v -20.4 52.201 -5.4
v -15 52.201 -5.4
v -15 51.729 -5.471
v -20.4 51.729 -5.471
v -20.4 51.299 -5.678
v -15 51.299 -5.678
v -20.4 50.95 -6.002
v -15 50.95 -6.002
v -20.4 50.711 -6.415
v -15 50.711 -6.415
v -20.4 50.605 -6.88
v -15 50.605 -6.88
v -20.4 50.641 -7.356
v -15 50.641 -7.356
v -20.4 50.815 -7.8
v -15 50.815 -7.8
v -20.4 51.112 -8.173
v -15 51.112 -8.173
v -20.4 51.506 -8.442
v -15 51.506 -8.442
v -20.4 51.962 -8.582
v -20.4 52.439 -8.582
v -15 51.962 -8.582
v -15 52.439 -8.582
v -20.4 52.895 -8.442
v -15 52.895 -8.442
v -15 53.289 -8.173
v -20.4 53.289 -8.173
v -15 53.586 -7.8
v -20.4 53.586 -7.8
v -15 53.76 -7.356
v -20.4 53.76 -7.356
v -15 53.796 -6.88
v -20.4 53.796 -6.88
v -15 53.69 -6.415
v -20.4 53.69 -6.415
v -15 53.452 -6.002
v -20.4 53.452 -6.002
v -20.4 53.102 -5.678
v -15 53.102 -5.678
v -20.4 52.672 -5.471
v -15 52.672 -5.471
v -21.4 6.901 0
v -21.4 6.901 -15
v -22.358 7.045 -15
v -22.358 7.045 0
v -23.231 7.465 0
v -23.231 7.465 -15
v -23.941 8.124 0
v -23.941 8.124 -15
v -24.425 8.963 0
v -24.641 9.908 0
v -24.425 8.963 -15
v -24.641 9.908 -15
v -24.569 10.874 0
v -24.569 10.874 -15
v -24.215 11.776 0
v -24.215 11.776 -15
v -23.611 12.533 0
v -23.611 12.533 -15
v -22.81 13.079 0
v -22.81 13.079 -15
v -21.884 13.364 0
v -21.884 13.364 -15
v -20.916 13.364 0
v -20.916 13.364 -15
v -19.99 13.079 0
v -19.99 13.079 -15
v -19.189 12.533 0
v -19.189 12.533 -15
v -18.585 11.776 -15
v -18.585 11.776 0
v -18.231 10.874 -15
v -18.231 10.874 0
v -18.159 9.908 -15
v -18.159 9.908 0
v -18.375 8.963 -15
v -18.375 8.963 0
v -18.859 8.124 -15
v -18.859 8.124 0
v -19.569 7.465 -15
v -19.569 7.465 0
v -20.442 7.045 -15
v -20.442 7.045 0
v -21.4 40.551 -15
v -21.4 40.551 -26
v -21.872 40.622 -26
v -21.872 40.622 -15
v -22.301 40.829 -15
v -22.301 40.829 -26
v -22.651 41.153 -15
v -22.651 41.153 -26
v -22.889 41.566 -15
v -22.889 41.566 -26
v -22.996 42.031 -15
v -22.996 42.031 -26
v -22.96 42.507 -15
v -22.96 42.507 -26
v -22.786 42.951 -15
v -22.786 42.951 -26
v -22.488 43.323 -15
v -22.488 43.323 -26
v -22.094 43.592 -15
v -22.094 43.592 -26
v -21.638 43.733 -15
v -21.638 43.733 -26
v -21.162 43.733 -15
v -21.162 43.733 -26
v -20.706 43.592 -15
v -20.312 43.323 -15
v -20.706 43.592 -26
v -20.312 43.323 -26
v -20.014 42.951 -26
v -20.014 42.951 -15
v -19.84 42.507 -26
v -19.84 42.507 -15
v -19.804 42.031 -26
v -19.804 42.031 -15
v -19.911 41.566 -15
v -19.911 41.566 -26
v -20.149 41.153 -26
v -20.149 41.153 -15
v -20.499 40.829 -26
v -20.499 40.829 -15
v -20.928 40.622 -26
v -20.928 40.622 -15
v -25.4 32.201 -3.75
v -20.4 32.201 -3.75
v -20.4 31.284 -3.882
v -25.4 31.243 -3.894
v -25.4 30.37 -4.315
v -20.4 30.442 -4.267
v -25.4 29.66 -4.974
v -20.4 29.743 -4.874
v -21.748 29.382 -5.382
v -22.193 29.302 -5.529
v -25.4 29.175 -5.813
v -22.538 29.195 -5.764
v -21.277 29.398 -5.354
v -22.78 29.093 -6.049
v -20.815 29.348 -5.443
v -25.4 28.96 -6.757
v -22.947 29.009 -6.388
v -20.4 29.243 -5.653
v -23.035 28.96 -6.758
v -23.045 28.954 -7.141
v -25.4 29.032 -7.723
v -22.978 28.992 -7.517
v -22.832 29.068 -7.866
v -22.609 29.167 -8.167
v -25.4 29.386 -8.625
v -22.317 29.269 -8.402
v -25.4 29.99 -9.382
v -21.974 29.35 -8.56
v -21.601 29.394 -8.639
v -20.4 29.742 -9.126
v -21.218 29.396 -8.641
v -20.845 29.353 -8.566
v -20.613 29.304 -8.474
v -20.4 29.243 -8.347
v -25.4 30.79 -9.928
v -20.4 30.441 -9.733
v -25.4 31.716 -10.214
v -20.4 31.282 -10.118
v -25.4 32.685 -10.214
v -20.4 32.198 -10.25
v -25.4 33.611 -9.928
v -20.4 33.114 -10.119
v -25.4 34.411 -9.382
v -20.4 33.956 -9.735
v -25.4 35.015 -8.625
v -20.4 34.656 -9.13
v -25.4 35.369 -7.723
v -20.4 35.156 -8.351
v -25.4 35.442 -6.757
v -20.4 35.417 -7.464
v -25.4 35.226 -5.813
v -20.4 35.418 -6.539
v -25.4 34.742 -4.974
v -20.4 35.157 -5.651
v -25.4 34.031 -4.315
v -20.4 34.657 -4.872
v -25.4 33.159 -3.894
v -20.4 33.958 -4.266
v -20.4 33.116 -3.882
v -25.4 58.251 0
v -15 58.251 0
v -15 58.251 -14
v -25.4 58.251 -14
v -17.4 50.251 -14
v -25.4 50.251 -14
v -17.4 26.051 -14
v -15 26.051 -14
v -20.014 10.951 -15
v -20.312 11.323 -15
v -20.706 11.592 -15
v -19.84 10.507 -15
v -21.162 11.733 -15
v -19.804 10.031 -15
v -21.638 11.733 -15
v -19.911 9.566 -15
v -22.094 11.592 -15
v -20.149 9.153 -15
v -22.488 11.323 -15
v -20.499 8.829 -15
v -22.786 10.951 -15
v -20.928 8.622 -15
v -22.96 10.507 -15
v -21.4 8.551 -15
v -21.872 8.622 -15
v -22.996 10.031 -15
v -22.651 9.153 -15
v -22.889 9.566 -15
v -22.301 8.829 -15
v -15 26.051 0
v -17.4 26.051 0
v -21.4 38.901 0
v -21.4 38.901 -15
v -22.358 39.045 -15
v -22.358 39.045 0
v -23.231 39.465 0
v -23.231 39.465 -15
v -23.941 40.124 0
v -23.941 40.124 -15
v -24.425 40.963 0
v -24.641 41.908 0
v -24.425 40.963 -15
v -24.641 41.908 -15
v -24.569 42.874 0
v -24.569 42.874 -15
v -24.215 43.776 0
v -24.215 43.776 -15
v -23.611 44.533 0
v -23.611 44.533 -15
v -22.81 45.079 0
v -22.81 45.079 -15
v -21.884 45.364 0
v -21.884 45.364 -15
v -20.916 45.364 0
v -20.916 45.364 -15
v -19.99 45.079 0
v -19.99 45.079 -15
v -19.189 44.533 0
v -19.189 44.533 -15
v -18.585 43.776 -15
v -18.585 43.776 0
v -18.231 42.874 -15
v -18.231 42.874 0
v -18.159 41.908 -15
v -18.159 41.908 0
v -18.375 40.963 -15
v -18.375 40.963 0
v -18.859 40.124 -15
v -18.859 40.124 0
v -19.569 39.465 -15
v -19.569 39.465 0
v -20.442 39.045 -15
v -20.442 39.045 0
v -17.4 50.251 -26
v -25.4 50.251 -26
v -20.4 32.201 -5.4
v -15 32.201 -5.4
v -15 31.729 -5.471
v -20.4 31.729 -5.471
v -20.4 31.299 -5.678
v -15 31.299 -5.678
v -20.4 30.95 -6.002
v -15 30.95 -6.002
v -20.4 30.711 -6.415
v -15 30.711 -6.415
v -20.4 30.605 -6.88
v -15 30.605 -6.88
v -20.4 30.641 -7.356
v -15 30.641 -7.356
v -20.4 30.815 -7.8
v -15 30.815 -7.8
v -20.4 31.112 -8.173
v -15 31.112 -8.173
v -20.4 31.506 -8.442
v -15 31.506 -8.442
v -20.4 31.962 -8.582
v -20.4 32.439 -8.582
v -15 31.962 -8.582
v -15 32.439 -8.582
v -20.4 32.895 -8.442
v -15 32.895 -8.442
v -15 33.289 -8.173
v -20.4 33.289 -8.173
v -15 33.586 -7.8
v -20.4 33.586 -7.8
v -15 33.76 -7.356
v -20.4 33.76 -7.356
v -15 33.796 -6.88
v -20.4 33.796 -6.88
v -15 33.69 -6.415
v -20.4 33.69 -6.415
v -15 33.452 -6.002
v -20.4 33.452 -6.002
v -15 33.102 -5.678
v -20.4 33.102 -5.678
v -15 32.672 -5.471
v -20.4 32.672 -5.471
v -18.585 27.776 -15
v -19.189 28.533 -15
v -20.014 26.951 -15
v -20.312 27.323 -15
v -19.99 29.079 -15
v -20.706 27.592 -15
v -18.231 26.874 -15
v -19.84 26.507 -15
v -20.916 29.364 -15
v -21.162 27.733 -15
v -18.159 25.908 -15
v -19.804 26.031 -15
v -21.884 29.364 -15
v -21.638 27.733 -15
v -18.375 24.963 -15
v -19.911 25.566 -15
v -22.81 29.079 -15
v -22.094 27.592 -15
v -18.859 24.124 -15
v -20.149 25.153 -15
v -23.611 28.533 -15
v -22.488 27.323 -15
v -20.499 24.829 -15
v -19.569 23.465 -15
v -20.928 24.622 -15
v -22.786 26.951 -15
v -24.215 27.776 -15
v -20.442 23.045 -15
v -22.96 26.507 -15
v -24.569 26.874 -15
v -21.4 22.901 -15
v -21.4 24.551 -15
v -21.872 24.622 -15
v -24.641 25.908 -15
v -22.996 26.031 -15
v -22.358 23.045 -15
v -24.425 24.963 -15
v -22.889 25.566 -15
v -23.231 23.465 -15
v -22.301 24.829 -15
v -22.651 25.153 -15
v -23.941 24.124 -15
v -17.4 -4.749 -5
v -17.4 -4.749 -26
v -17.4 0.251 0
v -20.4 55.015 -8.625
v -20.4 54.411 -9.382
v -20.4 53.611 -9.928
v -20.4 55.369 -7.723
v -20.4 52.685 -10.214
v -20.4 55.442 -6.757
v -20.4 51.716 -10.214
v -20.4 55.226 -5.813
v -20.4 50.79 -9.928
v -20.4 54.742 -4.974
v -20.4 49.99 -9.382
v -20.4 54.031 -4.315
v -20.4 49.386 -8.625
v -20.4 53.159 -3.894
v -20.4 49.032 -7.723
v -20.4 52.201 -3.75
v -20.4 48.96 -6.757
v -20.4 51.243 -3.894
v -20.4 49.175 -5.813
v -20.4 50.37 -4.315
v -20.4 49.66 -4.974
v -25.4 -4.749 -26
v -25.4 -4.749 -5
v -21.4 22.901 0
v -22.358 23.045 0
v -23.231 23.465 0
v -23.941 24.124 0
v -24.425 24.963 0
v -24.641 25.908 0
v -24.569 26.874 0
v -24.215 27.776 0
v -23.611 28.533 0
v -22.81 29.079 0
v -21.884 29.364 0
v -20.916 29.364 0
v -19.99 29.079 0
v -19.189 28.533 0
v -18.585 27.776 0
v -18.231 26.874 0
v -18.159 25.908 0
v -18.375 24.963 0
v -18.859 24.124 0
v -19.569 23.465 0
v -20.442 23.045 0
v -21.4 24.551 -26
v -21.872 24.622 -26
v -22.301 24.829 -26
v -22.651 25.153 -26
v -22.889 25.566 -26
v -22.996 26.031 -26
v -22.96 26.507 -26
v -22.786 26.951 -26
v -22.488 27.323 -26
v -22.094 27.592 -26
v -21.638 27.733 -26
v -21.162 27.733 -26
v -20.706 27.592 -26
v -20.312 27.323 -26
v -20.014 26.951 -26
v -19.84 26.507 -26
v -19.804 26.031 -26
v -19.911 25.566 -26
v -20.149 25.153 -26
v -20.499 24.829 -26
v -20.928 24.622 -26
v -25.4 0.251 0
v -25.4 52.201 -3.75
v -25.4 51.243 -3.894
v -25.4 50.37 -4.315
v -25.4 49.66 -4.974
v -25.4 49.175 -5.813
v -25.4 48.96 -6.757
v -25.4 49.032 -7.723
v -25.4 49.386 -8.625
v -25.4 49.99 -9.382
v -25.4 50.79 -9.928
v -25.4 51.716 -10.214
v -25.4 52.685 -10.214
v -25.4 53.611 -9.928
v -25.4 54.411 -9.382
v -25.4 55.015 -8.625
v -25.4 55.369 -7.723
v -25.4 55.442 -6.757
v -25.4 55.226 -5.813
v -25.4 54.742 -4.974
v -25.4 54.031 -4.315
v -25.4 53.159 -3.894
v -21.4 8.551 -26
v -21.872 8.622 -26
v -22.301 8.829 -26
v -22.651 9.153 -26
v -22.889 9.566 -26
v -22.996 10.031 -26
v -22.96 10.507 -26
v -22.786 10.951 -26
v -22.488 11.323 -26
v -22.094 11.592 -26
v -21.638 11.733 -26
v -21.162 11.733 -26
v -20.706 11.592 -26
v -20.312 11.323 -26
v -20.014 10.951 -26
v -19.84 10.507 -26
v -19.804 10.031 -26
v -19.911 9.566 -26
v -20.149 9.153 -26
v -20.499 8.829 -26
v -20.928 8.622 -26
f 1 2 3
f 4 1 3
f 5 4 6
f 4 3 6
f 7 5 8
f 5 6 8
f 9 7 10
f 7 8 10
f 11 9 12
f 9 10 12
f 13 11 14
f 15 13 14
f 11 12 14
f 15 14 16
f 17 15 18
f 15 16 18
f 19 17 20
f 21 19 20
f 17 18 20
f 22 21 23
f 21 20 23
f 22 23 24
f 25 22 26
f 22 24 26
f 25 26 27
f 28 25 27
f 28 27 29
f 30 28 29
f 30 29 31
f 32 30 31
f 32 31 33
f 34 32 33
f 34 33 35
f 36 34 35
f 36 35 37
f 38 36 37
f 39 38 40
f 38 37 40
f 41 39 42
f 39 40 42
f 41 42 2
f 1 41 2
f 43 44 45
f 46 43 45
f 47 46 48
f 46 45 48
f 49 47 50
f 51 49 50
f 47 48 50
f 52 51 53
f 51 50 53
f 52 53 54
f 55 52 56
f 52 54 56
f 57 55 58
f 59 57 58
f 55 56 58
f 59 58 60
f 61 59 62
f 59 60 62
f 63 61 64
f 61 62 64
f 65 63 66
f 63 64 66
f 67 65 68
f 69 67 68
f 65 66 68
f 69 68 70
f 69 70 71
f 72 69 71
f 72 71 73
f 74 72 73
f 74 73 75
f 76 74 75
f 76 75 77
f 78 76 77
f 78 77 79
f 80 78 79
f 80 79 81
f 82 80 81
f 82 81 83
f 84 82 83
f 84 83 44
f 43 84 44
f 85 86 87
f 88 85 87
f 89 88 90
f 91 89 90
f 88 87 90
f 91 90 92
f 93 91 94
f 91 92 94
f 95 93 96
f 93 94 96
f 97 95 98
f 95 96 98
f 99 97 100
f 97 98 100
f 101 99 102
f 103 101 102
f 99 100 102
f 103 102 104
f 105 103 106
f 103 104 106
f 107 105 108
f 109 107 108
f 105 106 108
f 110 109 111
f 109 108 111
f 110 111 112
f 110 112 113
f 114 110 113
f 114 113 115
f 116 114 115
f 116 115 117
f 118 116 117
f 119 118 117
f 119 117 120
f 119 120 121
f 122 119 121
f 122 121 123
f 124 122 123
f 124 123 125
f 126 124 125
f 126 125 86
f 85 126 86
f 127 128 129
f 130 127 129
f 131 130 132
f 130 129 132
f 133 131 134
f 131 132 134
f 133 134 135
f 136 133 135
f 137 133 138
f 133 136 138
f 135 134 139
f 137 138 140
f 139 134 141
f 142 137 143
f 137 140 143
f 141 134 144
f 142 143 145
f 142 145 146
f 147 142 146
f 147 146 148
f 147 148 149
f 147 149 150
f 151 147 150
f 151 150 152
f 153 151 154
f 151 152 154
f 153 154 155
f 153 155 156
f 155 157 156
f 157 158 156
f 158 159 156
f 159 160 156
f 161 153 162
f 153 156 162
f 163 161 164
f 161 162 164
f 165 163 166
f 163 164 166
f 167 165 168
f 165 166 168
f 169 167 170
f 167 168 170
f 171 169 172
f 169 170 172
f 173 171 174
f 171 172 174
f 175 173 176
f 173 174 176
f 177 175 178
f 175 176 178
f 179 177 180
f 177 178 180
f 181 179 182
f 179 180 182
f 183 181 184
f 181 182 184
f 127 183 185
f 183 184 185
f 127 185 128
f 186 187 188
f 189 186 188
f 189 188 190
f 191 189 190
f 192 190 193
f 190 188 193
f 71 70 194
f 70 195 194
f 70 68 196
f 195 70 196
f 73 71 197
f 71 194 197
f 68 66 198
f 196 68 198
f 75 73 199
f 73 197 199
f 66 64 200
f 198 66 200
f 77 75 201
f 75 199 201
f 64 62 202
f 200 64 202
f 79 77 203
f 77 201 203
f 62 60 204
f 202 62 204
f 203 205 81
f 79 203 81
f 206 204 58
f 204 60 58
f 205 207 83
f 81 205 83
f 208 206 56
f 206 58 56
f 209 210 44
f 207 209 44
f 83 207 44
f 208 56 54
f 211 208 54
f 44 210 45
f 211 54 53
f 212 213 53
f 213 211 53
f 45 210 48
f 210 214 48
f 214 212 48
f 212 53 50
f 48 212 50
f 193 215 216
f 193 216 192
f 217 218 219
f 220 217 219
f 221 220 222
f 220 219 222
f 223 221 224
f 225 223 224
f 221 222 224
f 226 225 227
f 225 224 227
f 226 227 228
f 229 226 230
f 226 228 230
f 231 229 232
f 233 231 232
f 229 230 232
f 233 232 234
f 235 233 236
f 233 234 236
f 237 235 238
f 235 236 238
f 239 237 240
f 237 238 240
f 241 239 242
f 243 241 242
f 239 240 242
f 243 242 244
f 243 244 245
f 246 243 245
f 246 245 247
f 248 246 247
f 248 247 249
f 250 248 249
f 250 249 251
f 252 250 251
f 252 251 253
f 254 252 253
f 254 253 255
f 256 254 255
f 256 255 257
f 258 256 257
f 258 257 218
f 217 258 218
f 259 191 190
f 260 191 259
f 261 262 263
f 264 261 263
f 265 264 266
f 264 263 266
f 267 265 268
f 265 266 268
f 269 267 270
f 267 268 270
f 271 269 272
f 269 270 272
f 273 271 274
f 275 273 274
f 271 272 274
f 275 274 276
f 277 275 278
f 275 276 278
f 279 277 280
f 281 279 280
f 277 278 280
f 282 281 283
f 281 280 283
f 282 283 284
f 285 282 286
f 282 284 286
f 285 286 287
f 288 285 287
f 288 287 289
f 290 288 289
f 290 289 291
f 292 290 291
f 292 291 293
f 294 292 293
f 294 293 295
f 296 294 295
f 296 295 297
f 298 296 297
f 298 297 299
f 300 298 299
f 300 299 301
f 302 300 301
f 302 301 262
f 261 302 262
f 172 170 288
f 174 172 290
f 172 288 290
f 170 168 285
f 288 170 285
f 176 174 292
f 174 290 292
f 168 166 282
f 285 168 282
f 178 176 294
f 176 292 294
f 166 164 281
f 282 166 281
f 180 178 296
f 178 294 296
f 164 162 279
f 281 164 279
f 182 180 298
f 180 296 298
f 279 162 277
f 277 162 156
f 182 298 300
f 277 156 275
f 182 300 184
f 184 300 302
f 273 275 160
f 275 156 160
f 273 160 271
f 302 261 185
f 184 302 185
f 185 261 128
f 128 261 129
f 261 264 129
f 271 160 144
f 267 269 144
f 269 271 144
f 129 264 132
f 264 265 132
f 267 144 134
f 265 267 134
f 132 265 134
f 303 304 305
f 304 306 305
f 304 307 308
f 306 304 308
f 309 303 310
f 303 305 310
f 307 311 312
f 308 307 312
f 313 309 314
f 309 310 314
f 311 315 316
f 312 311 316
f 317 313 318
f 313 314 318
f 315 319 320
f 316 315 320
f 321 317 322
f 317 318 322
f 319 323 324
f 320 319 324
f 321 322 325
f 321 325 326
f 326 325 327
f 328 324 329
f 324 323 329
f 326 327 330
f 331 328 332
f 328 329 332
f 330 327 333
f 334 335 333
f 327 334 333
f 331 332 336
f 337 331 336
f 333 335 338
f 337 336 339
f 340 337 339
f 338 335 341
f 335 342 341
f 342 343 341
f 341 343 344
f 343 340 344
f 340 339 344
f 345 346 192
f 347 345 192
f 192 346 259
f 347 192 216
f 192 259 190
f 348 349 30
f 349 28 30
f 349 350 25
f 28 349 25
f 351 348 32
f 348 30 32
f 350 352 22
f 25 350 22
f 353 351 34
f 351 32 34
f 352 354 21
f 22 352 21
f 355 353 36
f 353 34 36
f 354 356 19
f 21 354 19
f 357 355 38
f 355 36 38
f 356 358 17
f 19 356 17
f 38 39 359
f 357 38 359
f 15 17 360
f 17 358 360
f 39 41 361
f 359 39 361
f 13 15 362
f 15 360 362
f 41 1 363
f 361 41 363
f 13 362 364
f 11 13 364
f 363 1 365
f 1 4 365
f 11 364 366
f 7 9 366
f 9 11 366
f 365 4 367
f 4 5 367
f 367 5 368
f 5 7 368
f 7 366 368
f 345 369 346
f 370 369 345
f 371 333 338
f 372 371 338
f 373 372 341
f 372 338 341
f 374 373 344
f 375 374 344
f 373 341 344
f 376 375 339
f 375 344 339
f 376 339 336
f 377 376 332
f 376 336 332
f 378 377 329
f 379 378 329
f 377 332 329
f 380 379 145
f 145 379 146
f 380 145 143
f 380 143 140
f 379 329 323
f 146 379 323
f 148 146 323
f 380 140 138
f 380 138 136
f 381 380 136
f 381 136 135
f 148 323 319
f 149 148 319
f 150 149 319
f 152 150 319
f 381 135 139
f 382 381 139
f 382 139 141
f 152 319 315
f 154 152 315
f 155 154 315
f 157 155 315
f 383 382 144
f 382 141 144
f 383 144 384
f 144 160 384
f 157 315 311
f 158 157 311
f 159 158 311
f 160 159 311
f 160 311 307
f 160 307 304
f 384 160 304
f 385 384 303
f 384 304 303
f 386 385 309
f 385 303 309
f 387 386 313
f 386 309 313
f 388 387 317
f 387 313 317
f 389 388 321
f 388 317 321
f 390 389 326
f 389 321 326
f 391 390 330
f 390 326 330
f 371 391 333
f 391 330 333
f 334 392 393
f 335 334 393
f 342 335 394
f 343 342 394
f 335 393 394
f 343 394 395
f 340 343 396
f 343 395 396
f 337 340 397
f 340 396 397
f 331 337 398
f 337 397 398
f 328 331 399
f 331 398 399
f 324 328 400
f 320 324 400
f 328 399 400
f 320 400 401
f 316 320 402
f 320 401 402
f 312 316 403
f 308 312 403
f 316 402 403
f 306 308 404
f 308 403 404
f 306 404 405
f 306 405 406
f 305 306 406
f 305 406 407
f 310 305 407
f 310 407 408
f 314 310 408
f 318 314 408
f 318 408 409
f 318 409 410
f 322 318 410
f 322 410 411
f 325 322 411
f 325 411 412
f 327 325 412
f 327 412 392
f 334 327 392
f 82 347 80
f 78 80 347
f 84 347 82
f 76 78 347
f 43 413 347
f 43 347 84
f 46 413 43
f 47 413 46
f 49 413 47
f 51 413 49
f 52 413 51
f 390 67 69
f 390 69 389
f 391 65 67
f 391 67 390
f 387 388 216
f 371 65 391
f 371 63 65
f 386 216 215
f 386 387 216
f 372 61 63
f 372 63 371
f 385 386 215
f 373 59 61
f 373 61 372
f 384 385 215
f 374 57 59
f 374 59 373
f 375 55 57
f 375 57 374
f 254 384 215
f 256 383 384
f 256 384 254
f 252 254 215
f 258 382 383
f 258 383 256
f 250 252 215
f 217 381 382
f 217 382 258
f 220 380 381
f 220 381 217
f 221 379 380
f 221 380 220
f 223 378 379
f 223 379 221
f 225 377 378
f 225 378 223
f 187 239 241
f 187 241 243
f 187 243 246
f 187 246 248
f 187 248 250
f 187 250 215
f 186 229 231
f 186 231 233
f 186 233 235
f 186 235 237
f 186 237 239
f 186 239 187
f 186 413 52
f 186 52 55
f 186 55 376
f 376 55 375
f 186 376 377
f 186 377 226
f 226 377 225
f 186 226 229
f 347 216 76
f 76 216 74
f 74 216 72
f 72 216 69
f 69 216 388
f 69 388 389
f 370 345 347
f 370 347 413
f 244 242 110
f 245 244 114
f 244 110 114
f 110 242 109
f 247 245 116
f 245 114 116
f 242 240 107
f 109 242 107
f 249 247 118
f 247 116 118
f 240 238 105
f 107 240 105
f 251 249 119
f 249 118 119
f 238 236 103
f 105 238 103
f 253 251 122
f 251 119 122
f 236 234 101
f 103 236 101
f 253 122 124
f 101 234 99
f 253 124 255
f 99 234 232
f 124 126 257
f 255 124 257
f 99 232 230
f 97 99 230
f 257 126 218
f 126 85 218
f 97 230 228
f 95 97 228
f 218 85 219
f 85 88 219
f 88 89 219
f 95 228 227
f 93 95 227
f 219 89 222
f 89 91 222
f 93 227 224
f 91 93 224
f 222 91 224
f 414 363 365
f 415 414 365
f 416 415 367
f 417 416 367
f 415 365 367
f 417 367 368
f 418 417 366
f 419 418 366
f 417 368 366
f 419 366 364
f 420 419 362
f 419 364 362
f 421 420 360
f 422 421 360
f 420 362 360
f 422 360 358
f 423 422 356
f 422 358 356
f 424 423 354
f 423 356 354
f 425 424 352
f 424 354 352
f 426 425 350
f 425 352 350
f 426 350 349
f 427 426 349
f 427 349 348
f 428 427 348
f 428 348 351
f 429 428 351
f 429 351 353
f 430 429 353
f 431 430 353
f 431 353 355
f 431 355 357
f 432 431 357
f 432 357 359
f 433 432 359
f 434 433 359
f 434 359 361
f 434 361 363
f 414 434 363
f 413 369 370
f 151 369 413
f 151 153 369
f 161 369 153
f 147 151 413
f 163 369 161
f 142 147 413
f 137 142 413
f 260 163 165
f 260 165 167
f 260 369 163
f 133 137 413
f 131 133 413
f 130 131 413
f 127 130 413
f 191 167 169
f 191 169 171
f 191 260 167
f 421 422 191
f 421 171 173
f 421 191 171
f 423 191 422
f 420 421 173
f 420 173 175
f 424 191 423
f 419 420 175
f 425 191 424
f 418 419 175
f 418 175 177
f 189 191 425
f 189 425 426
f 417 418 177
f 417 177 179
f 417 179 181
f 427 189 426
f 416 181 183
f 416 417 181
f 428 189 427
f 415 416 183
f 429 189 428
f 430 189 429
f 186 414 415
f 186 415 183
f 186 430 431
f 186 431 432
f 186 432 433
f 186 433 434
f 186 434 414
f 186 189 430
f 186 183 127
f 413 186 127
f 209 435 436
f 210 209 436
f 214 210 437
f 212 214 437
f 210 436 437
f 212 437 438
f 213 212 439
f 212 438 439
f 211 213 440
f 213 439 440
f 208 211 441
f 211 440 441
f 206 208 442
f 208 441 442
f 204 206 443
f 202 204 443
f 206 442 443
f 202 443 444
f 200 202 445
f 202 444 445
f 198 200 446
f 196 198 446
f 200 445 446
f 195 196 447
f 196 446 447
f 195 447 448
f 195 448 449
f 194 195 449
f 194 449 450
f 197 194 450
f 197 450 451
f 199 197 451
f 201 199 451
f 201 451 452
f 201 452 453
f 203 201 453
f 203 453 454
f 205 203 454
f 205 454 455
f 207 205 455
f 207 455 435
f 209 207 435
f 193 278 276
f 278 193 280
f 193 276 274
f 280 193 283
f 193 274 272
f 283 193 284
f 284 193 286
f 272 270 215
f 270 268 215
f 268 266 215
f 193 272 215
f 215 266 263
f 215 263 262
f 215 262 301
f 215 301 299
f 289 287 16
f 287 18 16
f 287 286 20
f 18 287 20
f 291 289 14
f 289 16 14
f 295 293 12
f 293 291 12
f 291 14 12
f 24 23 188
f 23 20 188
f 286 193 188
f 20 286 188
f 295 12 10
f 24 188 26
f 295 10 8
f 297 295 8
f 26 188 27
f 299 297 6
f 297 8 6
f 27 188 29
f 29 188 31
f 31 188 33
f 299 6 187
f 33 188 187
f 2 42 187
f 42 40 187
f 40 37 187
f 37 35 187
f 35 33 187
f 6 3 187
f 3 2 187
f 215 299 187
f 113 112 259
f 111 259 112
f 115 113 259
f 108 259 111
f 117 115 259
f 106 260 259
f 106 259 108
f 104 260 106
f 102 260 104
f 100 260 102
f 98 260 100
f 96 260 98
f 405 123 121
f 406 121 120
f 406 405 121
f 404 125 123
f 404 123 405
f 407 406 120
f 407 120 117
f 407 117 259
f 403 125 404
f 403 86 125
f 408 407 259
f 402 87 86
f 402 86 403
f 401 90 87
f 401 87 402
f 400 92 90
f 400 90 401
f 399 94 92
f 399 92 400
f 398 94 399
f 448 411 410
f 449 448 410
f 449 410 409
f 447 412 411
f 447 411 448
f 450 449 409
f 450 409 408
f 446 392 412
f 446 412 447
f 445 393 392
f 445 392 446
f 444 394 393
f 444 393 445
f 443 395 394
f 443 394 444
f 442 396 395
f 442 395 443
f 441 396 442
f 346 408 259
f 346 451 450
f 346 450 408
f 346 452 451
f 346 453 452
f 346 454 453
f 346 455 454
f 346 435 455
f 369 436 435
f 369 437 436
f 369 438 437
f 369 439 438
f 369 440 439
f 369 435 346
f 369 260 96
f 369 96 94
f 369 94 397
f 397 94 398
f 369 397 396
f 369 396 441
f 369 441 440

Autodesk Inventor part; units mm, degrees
ref_plane "YZ Plane" through (0, 0, 0) normal (1, 0, 0) x (0, 1, 0)
ref_plane "XZ Plane" through (0, 0, 0) normal (0, 1, 0) x (-1, 0, 0)
ref_plane "XY Plane" through (0, 0, 0) normal (0, 0, 1) x (1, 0, 0)
ref_plane "Arbeitsebene1" through (0, 0, 0) normal (0, 0, 1) x (1, 0, 0)
ref_plane "Arbeitsebene2" through (-25.4, 26.0506, 0) normal (-1, 0, 0) x (0, 0, 1)
sketch "Skizze2" plane through (-25.4, 26.0506, 0) normal (-1, 0, 0) x (0, 0, 1)
  line L0 (0, 0) -> (0, 32.2) projected
  line L1 (0, 24.2) -> (-26, 24.2)
  line L2 (-26, 24.2) -> (-26, -30.8)
  line L3 (-26, -30.8) -> (0, -30.8)
  line L4 (0, -30.8) -> (0, 24.2)
  line L5 (5, 0) -> (0, 0)
  line L6 (0, 0) -> (0, -30.8)
  line L7 (0, -30.8) -> (5, -30.8)
  point P0 (0, -26.0506)
  dimension "d26" = 26
  dimension "d27" = 55
extrude "Extrusion2" add sketch "Skizze2" against normal blind 8
ref_plane "Arbeitsebene3" through (0, 0, 5) normal (0, 0, 1) x (1, 0, 0)
sketch "Skizze6" plane through (0, 0, 5) normal (0, 0, 1) x (1, 0, 0)
  point P0 (0, 0)
ref_plane "Arbeitsebene4" through (0, 0, 5) normal (0, 0, 1) x (1, 0, 0)
ref_plane "Arbeitsebene5" through (-15, 26.0506, 0) normal (-1, 0, 0) x (0, 0, 1)
sketch "Skizze8" plane through (-15, 26.0506, 0) normal (-1, 0, 0) x (0, 0, 1)
  line L0 (-14, 32.2) -> (-14, 0) projected
  line L1 (0, 0) -> (-14, 0) projected
  line L2 (0, 32.2) -> (0, 0) projected
  line L3 (0, 32.2) -> (-14, 32.2) projected
  line L4 (-8.5, 27.35) -> (0, 27.35)
  line L5 (-8.5, 24.85) -> (0, 24.85)
  line L6 (-8.5, 7.35) -> (0, 7.35)
  line L7 (-8.5, 4.85) -> (0, 4.85)
  circle A0 centre (-7, 26.15) radius 1.6
  circle A1 centre (-7, 6.15) radius 1.6
  point P0 (0, -26.0506)
  dimension "d44" = 3.2
  dimension "d45" = 3.2
  dimension "d46" = 1.2
  dimension "d47" = 1.2
extrude "Extrusion6" add sketch "Skizze8" along normal up to surface (10.4 mm away) contours L3 L2 L4 A0 L5 L6 A1 L7 L1 L0 | L2 L5 A0 L4 | L7 A1 L6 L2
sketch "Skizze9" plane through (-25.4, 26.0506, 0) normal (-1, 0, 0) x (0, 0, 1)
  circle A0 centre (-7, 6.15) radius 1.6 projected
  circle A1 centre (-7, 26.15) radius 1.6 projected
  point P0 (0, -26.0506)
hole "Bohrung2" at (-25.4, 32.2006, -7) at (-25.4, 52.2006, -7) direction (1, 0, 0) diameter 3.2 end through all counterbore diameter 6.5 counterbore depth 5
sketch "Skizze7" plane through (0, 0, 5) normal (0, 0, 1) x (1, 0, 0)
  line L0 (15, 26.0506) -> (15, 58.2506) projected
  line L1 (15, 58.2506) -> (-25.4, 58.2506) projected
  line L2 (-25.4, 58.2506) -> (-25.4, -4.7494) projected
  line L3 (-25.4, -4.7494) -> (-17.4, -4.7494) projected
  line L4 (-17.4, 26.0506) -> (-17.4, -4.7494) projected
  line L5 (-17.4, 26.0506) -> (15, 26.0506) projected
  circle A0 centre (-21.4, 10.1506) radius 1.5
  circle A1 centre (-21.4, 26.1506) radius 1.4
  circle A2 centre (-21.4, 42.1506) radius 1.4
  point P0 (0, 0)
  dimension "d38" = 3
  dimension "d57" = 2.8
  dimension "d58" = 2.8
  dimension "d59" = 16
  dimension "d60" = 16
  dimension "d61" = 8
  dimension "d62" = 4
  dimension "d63" = 4
  dimension "d64" = 4
  dimension "d65" = 16.1
hole "Bohrung1" at (-21.4, 42.1506, 5) at (-21.4, 26.1506, 5) at (-21.4, 10.1506, 5) direction (0, 0, -1) diameter 3.2 end through all counterbore diameter 6.5 counterbore depth 20
sketch "Skizze10" plane through (-15, 26.0506, 0) normal (1, 0, 0) x (0, 0, -1)
  line L0 (0, 32.2) -> (14, 32.2)
  line L1 (14, 0) -> (14, 32.2)
  line L2 (0, 0) -> (0, 32.2)
  circle A0 centre (-2.5, 50.2) radius 1.5 construction
  circle A1 centre (12.5, 50.2) radius 1.5 construction
  line L3 (13, 67.2) -> (-3, 67.2)
  line L4 (-5, 66.0453) -> (-5, 48.3547)
  line L5 (14.75, 176.5265) -> (14.75, -9.4735)
  line L6 (-5, 32.2) -> (14.75, 32.2)
  line L7 (14.75, 32.2) -> (14.75, 67.2)
  line L8 (14.75, 67.2) -> (-5, 67.2)
  line L9 (-5, 67.2) -> (-5, 32.2)
  line L10 (10, 52.2) -> (10, 45.2)
  line L11 (10, 52.2) -> (8.35, 52.2)
  line L12 (0, 45.2) -> (0, 52.2)
  line L13 (10, 44.2036) -> (0, 44.2036)
  line L14 (0, 44.2036) -> (0, 57.2)
  line L15 (0, 57.2) -> (10, 57.2)
  line L16 (10, 57.2) -> (10, 44.2036)
  circle A2 centre (12.5, 50.2) radius 1.4
  circle A3 centre (-2.5, 50.2) radius 1.4
  line L17 (-5, 32.2) -> (0, 27.2)
  line L18 (0, -30.8) -> (0, 32.2) projected
  line L19 (-5, 32.2) -> (2.0711, 32.2) construction
  line L20 (0, 27.2) -> (0, 32.2)
  line L21 (14.75, 32.2) -> (14.75, 24.2)
  line L22 (26, 24.2) -> (14, 24.2) projected
  point P0 (0, -26.0506)
  point P1 (10, 45.2)
  point P2 (0, 32.2)
  point P3 (14.75, 32.2)
  point P4 (13, 67.2)
  point P5 (0, 27.2)
  dimension "d66" = 2.8
  dimension "d67" = 2.8
  dimension "d70" = 45
extrude "Extrusion7" [suppressed]
chamfer "Fase2" distance 5 angle 45 1 edges at (-21.4, -4.7494, 0)
properties part number "30_XYTable_Aliexpress_Translatorarm_x"
